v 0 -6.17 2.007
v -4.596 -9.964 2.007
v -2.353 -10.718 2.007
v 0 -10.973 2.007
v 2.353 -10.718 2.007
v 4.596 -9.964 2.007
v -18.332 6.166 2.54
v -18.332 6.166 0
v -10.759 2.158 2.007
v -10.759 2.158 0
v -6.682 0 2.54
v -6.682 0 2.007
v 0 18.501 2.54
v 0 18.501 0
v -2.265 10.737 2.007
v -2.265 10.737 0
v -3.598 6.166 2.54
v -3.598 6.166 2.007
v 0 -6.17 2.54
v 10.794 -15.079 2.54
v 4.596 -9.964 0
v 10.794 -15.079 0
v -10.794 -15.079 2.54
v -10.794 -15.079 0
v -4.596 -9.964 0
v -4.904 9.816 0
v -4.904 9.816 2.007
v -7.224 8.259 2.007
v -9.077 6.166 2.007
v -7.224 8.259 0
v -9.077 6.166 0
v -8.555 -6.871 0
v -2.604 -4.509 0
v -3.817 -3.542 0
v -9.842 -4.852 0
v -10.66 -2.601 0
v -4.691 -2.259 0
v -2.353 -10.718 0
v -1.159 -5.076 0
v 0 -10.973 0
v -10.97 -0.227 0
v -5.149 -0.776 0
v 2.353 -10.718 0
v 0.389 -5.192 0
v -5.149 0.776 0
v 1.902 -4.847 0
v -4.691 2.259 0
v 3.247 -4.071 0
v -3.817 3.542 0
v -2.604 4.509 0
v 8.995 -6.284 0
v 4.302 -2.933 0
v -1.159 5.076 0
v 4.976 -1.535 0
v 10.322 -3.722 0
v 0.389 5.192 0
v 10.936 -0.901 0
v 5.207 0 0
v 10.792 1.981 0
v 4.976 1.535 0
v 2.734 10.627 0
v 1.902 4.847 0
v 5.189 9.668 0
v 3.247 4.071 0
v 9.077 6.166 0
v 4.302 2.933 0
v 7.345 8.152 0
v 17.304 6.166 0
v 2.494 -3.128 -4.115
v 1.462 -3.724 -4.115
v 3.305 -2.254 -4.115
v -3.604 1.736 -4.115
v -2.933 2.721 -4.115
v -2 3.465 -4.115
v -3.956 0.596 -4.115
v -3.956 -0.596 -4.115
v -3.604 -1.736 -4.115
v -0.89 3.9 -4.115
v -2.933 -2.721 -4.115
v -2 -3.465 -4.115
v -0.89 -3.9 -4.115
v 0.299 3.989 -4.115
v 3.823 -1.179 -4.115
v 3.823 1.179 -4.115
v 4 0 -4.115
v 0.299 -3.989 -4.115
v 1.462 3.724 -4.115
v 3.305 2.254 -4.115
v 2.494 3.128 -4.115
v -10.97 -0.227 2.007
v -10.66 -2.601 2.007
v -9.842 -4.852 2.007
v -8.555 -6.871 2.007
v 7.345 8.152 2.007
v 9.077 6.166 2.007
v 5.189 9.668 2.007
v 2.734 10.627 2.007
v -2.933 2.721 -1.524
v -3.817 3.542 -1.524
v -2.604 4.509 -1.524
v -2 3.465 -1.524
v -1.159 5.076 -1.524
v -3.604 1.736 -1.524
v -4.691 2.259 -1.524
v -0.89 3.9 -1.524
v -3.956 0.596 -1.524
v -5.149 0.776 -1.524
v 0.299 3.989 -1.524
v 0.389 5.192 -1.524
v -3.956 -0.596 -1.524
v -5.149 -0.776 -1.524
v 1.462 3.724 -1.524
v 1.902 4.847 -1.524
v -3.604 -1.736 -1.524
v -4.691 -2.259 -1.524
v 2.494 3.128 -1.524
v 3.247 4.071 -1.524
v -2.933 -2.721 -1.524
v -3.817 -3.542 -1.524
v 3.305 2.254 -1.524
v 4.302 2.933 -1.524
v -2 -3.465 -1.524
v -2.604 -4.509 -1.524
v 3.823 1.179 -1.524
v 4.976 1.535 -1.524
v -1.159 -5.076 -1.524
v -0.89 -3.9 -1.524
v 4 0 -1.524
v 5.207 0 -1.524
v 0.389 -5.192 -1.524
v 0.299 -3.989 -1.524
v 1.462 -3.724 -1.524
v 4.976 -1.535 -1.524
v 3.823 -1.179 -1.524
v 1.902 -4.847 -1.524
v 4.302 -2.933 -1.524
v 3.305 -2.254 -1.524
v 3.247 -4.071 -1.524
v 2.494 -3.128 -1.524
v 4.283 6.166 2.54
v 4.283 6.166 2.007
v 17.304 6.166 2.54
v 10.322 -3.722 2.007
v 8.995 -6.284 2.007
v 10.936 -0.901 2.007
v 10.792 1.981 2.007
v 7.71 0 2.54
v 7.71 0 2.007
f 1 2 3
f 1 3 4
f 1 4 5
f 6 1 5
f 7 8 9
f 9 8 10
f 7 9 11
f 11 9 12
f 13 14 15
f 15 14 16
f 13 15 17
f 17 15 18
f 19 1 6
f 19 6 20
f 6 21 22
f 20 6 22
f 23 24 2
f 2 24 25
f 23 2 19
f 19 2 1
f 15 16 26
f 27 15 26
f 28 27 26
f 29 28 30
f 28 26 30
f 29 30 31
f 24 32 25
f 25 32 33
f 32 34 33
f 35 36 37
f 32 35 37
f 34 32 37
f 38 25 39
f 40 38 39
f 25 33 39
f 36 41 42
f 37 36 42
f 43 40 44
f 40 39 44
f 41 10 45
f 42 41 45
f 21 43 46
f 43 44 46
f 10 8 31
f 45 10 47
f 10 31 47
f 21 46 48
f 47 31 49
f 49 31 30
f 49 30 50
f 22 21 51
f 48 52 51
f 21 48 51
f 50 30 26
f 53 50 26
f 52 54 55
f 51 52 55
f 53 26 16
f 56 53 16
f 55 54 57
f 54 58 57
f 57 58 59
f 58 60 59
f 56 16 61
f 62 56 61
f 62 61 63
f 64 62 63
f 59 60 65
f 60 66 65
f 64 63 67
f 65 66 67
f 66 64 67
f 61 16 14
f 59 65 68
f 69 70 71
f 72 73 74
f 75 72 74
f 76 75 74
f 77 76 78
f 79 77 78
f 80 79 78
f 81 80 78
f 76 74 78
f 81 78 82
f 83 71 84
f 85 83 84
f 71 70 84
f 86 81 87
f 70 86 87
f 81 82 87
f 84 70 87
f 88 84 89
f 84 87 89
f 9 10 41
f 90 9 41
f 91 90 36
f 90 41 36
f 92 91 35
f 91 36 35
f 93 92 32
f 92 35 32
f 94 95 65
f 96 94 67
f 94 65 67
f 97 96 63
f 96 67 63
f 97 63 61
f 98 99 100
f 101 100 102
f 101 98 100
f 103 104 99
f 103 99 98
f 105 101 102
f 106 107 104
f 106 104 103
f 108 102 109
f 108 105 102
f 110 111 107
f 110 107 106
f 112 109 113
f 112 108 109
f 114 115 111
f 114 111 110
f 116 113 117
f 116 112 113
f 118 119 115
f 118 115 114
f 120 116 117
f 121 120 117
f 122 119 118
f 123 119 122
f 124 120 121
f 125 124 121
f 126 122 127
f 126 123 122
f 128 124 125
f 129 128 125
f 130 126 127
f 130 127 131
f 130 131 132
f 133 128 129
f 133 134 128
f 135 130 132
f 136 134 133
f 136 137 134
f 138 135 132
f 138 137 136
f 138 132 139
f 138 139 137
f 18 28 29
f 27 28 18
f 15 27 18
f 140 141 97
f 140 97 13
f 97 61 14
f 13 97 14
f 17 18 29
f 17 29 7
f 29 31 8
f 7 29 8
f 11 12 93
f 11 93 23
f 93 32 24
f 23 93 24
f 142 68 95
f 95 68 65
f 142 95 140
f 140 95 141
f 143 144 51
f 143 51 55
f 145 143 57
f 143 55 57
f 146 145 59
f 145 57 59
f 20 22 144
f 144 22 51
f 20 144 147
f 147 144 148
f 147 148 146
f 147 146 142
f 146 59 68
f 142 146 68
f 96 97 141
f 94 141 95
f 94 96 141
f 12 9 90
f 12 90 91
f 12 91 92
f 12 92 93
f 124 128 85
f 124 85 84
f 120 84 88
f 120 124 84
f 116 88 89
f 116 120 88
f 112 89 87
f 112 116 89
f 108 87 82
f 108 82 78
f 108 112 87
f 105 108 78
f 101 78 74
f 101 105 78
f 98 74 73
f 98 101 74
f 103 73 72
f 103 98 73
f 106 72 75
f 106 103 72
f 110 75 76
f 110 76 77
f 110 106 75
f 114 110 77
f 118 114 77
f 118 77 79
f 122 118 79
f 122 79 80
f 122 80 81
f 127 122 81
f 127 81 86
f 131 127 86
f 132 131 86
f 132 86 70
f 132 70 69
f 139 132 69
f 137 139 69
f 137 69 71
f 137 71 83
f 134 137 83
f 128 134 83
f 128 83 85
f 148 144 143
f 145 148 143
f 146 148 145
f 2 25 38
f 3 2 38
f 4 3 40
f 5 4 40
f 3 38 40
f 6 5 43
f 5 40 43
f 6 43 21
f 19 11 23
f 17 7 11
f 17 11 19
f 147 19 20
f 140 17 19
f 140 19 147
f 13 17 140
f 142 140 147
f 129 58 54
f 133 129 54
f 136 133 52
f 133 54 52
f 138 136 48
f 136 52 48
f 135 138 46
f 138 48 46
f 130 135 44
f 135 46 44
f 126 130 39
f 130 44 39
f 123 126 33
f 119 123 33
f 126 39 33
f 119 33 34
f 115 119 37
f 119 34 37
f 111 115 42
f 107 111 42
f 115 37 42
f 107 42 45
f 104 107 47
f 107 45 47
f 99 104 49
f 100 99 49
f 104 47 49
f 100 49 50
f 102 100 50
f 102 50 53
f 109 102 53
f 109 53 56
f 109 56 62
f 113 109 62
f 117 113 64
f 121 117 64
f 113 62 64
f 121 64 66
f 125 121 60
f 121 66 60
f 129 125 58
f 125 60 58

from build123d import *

# Parameters (mm, degrees)
F0_R     = 10.9728
F1_DEPTH = 2.0066
F2_R     = 5.207
F3_DEPTH = 1.524
F4_R     = 4.0005
F5_DEPTH = 4.1148
F8_DEPTH = 2.54


with BuildPart() as f1:
    # F0 (on Top) → F1 (new body)
    with BuildSketch(Plane.XY):
        Circle(F0_R)
    extrude(amount=F1_DEPTH)

    # F2 (on face) → F3 (join)
    with BuildSketch(Plane(origin=(0, 0, 0), x_dir=(1, 0, 0), z_dir=(0, 0, -1))):
        Circle(F2_R)
    extrude(amount=F3_DEPTH)

    # F4 (on Top) → F5 (join)
    with BuildSketch(Plane.XY):
        Circle(F4_R)
    extrude(amount=-F5_DEPTH)

    # F7 (on face) → F8 (join)
    with BuildSketch(Plane.XY):
        Polygon((4.283191, 6.165847), (0, 18.501436), (-3.597881, 6.165847), (-18.332055, 6.165847), (-6.681778, 0), (-10.79364, -15.078778), (0, -6.169742), (10.79364, -15.078778), (7.709743, 0), (17.304089, 6.165847), align=None)
    extrude(amount=F8_DEPTH)


solid = f1.part
